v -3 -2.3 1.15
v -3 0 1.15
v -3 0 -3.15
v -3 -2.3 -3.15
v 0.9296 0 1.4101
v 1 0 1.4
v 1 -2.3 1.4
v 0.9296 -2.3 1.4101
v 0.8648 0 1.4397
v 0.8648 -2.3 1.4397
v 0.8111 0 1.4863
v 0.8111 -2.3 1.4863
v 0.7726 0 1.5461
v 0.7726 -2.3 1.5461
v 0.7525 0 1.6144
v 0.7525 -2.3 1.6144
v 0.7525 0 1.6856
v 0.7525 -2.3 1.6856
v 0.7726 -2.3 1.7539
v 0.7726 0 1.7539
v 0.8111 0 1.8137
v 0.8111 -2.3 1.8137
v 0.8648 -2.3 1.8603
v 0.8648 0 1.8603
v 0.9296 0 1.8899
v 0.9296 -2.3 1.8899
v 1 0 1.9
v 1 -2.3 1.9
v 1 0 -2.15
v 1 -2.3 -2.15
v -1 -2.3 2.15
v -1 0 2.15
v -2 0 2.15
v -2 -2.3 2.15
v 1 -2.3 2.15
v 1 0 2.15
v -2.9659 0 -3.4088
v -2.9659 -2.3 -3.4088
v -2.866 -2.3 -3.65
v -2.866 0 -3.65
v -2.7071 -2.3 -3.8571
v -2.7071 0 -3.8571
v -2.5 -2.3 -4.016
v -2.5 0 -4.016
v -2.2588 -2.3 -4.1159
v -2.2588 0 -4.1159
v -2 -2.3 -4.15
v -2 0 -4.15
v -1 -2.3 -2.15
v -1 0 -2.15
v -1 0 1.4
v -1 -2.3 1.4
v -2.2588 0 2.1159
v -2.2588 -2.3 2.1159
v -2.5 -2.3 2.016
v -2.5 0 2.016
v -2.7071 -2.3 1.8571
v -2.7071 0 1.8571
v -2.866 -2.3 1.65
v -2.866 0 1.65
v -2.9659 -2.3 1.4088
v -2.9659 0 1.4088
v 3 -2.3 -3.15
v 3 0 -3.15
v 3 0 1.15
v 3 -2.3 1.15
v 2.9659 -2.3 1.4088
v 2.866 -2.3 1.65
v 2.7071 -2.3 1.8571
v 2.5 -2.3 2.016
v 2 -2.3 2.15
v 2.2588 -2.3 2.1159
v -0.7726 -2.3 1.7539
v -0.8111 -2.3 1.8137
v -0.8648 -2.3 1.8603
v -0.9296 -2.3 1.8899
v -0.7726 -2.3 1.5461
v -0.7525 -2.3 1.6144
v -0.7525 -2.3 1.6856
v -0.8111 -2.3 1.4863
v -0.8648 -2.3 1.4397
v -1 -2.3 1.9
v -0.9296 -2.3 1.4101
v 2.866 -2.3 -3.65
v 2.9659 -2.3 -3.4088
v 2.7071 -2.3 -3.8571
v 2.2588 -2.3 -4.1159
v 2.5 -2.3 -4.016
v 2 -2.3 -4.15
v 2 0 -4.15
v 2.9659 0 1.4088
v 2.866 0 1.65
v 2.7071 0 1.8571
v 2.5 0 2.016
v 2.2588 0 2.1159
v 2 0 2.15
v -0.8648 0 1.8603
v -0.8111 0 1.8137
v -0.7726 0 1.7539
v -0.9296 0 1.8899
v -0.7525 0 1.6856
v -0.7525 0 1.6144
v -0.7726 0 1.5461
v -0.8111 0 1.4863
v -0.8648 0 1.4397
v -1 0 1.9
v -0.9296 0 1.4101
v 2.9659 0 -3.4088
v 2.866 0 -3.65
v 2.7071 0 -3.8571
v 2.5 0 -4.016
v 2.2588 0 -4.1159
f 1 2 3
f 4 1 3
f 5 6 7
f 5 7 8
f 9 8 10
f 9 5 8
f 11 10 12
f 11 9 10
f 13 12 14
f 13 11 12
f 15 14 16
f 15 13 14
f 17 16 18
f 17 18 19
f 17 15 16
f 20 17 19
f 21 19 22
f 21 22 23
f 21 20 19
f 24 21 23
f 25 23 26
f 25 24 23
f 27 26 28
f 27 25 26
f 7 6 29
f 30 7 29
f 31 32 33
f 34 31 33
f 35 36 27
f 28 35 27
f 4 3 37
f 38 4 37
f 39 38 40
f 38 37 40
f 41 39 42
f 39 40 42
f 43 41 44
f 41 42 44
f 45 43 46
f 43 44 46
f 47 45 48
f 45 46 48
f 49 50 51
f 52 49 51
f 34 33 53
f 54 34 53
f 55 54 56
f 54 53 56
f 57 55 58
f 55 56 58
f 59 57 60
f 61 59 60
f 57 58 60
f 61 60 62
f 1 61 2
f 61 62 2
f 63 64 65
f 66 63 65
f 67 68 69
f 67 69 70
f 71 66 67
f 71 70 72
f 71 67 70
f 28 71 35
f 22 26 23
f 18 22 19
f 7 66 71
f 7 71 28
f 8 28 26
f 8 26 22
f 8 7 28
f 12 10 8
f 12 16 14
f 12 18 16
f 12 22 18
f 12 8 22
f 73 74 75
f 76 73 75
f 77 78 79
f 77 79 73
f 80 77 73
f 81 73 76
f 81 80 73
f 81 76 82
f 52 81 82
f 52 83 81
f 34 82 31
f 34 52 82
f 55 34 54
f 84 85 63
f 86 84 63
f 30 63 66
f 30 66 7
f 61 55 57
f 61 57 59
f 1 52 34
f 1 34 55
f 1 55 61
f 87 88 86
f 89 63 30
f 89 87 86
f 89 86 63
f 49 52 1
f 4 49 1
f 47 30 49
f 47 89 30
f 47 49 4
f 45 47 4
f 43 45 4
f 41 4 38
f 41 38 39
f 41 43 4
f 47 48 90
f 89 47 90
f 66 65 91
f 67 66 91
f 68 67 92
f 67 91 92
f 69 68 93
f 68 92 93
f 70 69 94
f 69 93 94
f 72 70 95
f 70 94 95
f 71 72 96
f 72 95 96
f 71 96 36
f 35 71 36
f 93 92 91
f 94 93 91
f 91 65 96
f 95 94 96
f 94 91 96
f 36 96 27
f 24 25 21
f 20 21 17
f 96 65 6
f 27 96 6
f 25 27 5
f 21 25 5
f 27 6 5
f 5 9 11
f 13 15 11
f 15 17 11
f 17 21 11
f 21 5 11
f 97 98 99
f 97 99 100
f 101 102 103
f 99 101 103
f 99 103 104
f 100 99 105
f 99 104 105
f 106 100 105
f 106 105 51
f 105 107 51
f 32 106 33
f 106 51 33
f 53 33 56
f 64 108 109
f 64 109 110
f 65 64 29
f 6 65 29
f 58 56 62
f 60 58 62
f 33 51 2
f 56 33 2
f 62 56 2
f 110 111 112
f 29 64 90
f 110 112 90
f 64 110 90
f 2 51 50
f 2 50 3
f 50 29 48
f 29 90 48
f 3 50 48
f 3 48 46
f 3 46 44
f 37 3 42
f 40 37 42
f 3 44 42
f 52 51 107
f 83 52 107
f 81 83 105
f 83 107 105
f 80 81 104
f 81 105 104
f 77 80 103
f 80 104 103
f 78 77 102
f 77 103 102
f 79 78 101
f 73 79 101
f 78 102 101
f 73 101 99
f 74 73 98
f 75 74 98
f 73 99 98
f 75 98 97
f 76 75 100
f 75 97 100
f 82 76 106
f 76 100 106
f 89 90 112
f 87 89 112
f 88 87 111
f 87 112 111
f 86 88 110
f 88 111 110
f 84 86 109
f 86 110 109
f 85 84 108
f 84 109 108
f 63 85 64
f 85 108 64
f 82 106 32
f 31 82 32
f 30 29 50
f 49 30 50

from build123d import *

# Parameters (mm, degrees)
BASE_FLANGE1_DEPTH = 2.3
TAB1_DEPTH         = 2.3


# Sheet-metal steps are written as plain solids
with BuildPart() as part:
    # Sketch1 → Base-Flange1 (new body)
    with BuildSketch(Plane(origin=(0, 0, 0), x_dir=(1, 0, 0), z_dir=(0, 1, 0))):
        with BuildLine():
            Line((-1, -2.15), (-2, -2.15))
            ThreePointArc((-2, -2.15), (-2.707106781, -1.857106781), (-3, -1.15))
            Line((-3, -1.15), (-3, 3.15))
            ThreePointArc((-3, 3.15), (-2.707106781, 3.857106781), (-2, 4.15))
            Line((-2, 4.15), (2, 4.15))
            ThreePointArc((2, 4.15), (2.707106781, 3.857106781), (3, 3.15))
            Line((3, 3.15), (3, -1.15))
            ThreePointArc((3, -1.15), (2.707106781, -1.857106781), (2, -2.15))
            Line((2, -2.15), (1, -2.15))
            Line((1, -2.15), (1, 2.15))
            Line((1, 2.15), (-1, 2.15))
            Line((-1, 2.15), (-1, -2.15))
        make_face()
    extrude(amount=-BASE_FLANGE1_DEPTH)

    # Sketch6 → Tab1 (add)
    with BuildSketch(Plane(origin=(0, 0, 0), x_dir=(1, 0, 0), z_dir=(0, 1, 0))):
        with BuildLine():
            Line((-1, -1.9), (-1, -1.4))
            ThreePointArc((-1, -1.4), (-0.75, -1.65), (-1, -1.9))
        make_face()
        with BuildLine():
            Line((1, -1.9), (1, -1.4))
            ThreePointArc((1, -1.4), (0.75, -1.65), (1, -1.9))
        make_face()
    extrude(amount=-TAB1_DEPTH)


solid = part.part
